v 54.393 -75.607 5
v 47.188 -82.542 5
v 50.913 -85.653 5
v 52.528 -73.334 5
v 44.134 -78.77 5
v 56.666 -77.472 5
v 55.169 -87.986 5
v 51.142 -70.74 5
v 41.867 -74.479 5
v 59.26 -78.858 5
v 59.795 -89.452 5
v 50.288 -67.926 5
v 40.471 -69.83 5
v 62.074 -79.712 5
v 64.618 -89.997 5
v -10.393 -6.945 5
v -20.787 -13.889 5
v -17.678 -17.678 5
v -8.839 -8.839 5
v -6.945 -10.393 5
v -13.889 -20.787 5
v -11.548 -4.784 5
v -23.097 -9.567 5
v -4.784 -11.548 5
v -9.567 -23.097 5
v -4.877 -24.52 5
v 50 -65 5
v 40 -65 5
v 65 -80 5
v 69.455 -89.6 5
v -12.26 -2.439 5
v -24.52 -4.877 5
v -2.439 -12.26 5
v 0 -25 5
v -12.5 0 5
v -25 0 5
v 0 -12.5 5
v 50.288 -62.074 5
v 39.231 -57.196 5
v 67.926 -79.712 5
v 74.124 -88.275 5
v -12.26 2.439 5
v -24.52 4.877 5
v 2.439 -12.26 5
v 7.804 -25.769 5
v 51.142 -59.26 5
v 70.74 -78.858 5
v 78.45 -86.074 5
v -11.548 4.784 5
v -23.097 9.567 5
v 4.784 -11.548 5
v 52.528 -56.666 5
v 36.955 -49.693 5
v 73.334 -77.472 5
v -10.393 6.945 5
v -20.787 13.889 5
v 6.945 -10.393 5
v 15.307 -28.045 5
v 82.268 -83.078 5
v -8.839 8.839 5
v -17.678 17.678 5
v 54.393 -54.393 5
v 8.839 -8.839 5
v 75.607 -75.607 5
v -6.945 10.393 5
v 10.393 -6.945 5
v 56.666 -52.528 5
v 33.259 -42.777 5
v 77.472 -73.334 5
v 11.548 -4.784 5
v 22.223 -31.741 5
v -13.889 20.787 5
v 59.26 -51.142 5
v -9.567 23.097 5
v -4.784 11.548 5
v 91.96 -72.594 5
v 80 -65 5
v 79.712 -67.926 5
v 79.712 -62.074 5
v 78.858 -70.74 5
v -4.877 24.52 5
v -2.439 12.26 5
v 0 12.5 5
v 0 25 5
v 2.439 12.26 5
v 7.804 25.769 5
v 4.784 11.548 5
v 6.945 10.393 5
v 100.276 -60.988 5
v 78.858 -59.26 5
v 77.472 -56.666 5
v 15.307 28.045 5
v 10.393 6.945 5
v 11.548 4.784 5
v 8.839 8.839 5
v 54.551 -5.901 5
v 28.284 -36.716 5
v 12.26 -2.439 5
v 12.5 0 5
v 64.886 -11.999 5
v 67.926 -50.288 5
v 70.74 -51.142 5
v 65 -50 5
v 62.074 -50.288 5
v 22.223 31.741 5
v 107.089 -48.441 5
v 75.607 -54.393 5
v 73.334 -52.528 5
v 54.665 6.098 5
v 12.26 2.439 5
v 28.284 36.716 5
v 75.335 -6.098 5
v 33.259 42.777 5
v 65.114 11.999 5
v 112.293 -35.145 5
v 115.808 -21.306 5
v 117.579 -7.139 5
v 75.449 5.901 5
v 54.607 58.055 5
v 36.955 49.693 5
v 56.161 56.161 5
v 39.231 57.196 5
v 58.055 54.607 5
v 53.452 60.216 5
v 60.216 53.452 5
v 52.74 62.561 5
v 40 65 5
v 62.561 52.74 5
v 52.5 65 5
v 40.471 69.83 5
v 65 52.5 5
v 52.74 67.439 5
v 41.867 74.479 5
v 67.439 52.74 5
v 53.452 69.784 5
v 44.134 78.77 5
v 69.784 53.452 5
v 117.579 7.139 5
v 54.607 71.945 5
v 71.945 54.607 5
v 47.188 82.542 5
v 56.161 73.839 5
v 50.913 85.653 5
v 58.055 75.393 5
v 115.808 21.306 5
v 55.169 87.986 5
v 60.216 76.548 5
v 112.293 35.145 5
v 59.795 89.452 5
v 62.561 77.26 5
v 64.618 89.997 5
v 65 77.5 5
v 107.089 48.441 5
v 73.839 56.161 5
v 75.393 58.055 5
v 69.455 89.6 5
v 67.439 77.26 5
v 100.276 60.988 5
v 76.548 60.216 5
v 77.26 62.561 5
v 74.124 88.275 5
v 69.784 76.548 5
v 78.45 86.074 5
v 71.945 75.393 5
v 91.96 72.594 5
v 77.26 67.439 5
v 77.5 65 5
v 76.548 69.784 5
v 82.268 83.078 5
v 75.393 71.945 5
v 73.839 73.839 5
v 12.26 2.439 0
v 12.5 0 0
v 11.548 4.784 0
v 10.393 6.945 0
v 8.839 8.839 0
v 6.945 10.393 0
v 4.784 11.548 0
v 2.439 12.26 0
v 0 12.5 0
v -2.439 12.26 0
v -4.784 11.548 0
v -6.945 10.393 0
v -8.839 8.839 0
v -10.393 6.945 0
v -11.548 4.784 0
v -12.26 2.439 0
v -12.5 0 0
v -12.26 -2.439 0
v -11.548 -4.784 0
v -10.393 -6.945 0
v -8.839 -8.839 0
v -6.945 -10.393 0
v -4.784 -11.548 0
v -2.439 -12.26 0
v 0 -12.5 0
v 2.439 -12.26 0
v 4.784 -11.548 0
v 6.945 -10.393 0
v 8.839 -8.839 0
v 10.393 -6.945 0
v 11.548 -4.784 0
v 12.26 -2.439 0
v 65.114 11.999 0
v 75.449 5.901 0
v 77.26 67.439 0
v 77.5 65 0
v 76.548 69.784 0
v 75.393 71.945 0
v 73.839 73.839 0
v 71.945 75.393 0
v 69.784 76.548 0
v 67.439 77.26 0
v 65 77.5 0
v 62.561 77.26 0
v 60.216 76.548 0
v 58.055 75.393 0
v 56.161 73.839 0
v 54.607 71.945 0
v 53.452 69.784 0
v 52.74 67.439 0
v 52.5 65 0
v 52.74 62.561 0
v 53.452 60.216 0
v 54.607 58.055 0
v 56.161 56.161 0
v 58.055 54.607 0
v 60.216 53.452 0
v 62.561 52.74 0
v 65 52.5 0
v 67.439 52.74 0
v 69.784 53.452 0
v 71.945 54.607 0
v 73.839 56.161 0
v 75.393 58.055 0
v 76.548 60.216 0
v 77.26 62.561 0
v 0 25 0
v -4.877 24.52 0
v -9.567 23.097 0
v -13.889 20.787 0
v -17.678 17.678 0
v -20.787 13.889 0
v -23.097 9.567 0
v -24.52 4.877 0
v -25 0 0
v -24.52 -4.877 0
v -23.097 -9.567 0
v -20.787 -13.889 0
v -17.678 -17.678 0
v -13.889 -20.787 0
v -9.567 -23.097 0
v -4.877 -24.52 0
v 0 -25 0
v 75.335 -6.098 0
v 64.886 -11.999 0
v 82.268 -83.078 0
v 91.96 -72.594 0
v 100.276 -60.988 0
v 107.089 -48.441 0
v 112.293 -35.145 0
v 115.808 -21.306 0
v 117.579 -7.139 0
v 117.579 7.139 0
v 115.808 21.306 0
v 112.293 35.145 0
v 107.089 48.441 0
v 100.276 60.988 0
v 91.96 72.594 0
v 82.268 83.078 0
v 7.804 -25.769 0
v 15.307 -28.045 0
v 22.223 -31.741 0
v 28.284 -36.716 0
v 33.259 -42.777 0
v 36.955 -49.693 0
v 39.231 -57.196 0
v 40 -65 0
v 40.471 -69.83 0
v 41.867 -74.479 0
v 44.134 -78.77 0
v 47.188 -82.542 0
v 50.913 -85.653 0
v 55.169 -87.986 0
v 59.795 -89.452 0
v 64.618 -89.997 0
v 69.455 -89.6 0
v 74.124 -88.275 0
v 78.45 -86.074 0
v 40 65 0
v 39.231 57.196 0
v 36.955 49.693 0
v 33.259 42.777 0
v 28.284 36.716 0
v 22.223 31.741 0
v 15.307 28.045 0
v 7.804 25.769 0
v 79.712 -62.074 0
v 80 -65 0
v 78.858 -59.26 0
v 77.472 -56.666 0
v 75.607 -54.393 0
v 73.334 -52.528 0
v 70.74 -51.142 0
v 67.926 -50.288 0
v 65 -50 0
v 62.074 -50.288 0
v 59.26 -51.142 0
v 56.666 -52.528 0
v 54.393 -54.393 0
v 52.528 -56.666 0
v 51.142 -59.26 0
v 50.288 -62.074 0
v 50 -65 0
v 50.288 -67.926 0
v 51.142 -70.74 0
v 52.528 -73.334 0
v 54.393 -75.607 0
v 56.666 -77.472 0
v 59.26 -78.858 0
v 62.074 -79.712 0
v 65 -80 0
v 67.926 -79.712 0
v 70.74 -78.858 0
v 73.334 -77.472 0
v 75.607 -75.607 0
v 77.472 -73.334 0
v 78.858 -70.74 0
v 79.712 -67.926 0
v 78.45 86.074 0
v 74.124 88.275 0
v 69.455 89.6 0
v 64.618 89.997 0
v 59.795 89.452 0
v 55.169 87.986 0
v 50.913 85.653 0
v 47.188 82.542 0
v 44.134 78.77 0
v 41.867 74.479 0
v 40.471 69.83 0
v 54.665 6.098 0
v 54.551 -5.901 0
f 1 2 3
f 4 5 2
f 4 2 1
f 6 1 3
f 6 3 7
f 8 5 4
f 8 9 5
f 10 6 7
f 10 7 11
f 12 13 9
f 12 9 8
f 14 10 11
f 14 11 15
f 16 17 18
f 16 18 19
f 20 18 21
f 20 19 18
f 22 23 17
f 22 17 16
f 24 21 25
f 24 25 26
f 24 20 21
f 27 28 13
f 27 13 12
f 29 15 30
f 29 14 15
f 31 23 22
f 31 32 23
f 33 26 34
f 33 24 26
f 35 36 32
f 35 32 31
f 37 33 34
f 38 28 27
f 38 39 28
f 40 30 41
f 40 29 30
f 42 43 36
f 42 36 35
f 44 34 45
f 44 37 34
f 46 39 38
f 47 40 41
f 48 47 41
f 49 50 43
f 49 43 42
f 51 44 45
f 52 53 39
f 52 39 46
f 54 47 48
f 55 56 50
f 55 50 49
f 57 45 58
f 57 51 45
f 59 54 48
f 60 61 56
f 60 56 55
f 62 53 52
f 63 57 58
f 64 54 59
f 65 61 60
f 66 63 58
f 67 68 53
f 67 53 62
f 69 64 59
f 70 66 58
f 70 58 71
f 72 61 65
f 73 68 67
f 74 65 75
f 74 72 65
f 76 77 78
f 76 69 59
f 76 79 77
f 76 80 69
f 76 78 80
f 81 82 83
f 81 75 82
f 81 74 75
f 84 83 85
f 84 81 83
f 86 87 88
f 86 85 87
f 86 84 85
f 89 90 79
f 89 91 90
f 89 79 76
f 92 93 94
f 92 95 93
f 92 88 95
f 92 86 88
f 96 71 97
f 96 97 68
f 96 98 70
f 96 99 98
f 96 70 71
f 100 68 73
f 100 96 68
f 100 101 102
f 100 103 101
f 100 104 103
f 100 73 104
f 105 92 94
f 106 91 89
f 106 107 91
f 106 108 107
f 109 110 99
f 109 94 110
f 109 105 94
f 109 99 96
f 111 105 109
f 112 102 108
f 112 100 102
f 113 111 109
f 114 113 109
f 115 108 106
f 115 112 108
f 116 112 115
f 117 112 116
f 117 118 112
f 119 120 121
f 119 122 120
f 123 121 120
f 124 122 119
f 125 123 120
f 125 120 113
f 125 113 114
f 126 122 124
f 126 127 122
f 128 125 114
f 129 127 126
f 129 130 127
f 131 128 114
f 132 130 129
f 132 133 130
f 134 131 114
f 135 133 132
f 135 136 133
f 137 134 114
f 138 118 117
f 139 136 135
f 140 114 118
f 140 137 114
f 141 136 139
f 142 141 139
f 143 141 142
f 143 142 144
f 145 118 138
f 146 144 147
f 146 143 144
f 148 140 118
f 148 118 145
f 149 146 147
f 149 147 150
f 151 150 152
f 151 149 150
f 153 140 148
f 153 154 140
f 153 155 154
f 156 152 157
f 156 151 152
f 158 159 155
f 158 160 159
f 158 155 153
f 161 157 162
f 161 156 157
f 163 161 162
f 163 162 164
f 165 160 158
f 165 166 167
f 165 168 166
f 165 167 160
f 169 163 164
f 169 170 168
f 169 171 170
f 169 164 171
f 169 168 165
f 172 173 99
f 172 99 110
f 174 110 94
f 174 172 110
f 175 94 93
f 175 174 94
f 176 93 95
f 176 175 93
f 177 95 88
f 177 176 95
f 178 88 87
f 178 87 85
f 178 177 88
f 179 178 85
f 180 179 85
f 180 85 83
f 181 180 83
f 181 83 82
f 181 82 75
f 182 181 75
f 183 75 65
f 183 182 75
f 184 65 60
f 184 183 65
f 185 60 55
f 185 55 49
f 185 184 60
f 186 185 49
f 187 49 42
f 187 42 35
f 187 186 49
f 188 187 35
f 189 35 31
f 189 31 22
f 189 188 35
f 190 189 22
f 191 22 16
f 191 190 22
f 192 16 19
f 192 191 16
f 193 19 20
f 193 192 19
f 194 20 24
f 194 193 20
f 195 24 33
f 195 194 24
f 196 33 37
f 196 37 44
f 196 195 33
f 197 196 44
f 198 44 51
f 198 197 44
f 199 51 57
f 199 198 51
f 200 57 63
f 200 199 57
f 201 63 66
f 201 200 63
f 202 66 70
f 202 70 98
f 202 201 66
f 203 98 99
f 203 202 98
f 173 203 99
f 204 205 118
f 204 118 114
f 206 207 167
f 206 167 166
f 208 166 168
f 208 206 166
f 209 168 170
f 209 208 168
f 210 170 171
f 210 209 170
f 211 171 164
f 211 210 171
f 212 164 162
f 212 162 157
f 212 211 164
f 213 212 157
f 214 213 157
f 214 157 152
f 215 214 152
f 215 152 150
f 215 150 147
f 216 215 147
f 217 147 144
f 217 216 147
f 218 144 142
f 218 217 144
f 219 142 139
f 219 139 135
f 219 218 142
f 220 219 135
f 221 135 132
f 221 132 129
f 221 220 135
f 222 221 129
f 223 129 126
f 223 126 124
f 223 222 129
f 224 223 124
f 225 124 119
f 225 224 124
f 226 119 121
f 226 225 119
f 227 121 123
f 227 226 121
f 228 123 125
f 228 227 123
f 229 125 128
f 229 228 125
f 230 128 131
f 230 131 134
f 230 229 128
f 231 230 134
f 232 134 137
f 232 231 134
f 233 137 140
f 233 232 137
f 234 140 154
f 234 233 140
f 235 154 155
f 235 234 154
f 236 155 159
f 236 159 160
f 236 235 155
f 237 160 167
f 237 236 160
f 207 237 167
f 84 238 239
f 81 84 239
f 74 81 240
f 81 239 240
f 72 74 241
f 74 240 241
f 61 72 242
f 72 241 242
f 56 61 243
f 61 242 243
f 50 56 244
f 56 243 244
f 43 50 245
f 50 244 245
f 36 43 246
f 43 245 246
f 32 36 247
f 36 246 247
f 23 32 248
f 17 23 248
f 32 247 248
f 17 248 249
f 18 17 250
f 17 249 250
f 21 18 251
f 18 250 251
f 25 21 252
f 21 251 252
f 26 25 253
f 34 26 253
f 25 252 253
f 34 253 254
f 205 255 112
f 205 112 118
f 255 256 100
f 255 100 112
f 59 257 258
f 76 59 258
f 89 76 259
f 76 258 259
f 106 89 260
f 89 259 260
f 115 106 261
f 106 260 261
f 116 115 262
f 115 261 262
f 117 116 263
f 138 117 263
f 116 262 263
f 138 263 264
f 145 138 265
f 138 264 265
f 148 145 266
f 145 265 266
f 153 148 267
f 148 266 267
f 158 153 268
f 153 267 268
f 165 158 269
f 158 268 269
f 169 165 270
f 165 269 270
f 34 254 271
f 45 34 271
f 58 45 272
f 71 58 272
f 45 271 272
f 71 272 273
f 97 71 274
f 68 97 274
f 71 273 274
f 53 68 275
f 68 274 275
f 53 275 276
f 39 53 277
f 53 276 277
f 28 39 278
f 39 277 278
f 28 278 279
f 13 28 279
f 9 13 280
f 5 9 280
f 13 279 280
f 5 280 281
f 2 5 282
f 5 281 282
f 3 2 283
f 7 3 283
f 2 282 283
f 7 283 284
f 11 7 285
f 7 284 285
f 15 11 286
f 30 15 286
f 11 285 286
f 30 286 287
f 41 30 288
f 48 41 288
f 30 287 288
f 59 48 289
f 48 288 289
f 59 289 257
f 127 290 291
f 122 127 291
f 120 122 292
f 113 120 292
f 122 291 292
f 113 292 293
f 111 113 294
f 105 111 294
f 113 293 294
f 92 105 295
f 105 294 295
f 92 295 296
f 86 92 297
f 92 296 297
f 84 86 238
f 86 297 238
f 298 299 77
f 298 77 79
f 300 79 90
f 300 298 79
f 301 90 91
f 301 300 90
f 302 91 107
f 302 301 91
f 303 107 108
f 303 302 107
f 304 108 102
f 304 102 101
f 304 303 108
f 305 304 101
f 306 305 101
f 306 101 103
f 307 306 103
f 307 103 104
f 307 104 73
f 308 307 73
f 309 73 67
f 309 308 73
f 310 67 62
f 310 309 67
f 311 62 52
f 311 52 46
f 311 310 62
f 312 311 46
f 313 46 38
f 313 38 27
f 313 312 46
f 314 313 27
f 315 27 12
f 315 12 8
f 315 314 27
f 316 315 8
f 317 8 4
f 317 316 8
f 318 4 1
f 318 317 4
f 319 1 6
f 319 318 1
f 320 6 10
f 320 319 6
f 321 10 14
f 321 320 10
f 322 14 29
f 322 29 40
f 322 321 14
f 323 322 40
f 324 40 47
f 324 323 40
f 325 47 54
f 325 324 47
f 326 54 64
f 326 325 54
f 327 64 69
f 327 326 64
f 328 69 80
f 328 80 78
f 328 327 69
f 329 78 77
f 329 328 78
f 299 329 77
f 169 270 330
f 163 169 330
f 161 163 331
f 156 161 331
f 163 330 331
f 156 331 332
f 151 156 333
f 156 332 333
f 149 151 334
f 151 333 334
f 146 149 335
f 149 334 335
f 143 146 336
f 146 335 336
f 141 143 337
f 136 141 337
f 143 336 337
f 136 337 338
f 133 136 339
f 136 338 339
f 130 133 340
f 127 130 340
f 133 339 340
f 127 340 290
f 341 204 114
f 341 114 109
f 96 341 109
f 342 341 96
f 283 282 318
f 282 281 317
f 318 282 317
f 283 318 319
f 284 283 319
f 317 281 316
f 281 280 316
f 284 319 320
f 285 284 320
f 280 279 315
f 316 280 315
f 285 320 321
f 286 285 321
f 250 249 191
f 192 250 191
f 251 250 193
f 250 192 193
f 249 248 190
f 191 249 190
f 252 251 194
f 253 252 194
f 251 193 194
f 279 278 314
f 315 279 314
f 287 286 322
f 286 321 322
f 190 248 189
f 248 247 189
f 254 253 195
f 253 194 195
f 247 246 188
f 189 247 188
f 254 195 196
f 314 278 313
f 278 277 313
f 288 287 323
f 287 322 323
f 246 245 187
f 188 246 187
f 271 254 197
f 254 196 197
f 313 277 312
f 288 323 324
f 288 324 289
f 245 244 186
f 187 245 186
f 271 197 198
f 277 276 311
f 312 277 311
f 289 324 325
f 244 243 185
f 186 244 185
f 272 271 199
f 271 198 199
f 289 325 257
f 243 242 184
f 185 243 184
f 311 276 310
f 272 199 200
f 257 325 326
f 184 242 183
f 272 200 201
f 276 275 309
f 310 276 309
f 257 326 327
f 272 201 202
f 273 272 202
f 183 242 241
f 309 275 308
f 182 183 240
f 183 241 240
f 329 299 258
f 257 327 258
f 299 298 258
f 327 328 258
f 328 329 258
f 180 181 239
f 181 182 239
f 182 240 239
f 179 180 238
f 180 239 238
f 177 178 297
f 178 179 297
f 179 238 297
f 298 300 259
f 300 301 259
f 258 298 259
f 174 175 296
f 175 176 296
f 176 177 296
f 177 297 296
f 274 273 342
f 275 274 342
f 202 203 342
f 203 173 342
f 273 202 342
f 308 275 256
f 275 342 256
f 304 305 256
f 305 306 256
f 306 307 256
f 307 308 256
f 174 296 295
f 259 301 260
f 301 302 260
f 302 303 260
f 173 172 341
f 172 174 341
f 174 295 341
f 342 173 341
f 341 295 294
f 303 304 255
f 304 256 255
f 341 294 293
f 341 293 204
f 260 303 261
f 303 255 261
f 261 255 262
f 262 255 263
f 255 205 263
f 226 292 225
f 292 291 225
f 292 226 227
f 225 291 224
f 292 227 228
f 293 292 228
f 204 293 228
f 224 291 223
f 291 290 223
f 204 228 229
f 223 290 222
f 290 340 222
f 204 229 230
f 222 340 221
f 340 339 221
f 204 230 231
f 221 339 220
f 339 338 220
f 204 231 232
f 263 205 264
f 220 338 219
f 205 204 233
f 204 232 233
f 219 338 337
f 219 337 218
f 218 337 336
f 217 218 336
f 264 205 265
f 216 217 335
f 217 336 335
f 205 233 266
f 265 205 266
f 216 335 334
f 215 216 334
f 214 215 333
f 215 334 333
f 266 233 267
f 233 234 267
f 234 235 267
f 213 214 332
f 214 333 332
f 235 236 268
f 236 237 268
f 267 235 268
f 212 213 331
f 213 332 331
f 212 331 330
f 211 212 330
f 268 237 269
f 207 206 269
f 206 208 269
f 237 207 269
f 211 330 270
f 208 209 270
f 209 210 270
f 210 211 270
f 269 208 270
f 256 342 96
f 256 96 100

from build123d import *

# Parameters (mm, degrees)
SKETCH2_R           = 12.5
SKETCH2_R_2         = 15
BOSS_EXTRUDE1_DEPTH = 5


with BuildPart() as part:
    # Sketch2 → Boss-Extrude1 (new body)
    with BuildSketch(Plane.XY):
        with BuildLine():
            ThreePointArc((0, 25), (-25, 0), (0, -25))
            ThreePointArc((0, -25), (28.284271247, -36.715728753), (40, -65))
            ThreePointArc((40, -65), (55.168868326, -87.985840207), (82.267908001, -83.078145737))
            ThreePointArc((82.267908001, -83.078145737), (117.800748333, 0), (82.267908001, 83.078145737))
            ThreePointArc((82.267908001, 83.078145737), (55.168868326, 87.985840207), (40, 65))
            ThreePointArc((40, 65), (28.284271247, 36.715728753), (0, 25))
        make_face()
        Circle(SKETCH2_R, mode=Mode.SUBTRACT)
        with Locations((65, 65)):
            Circle(SKETCH2_R, mode=Mode.SUBTRACT)
        with Locations((65, -65)):
            Circle(SKETCH2_R_2, mode=Mode.SUBTRACT)
        Polygon((75.334929147, -6.098298085), (75.448745635, 5.901162145), (65.113816488, 11.99946023), (54.665070853, 6.098298085), (54.551254365, -5.901162145), (64.886183512, -11.99946023), align=None, mode=Mode.SUBTRACT)
    extrude(amount=BOSS_EXTRUDE1_DEPTH)


solid = part.part
